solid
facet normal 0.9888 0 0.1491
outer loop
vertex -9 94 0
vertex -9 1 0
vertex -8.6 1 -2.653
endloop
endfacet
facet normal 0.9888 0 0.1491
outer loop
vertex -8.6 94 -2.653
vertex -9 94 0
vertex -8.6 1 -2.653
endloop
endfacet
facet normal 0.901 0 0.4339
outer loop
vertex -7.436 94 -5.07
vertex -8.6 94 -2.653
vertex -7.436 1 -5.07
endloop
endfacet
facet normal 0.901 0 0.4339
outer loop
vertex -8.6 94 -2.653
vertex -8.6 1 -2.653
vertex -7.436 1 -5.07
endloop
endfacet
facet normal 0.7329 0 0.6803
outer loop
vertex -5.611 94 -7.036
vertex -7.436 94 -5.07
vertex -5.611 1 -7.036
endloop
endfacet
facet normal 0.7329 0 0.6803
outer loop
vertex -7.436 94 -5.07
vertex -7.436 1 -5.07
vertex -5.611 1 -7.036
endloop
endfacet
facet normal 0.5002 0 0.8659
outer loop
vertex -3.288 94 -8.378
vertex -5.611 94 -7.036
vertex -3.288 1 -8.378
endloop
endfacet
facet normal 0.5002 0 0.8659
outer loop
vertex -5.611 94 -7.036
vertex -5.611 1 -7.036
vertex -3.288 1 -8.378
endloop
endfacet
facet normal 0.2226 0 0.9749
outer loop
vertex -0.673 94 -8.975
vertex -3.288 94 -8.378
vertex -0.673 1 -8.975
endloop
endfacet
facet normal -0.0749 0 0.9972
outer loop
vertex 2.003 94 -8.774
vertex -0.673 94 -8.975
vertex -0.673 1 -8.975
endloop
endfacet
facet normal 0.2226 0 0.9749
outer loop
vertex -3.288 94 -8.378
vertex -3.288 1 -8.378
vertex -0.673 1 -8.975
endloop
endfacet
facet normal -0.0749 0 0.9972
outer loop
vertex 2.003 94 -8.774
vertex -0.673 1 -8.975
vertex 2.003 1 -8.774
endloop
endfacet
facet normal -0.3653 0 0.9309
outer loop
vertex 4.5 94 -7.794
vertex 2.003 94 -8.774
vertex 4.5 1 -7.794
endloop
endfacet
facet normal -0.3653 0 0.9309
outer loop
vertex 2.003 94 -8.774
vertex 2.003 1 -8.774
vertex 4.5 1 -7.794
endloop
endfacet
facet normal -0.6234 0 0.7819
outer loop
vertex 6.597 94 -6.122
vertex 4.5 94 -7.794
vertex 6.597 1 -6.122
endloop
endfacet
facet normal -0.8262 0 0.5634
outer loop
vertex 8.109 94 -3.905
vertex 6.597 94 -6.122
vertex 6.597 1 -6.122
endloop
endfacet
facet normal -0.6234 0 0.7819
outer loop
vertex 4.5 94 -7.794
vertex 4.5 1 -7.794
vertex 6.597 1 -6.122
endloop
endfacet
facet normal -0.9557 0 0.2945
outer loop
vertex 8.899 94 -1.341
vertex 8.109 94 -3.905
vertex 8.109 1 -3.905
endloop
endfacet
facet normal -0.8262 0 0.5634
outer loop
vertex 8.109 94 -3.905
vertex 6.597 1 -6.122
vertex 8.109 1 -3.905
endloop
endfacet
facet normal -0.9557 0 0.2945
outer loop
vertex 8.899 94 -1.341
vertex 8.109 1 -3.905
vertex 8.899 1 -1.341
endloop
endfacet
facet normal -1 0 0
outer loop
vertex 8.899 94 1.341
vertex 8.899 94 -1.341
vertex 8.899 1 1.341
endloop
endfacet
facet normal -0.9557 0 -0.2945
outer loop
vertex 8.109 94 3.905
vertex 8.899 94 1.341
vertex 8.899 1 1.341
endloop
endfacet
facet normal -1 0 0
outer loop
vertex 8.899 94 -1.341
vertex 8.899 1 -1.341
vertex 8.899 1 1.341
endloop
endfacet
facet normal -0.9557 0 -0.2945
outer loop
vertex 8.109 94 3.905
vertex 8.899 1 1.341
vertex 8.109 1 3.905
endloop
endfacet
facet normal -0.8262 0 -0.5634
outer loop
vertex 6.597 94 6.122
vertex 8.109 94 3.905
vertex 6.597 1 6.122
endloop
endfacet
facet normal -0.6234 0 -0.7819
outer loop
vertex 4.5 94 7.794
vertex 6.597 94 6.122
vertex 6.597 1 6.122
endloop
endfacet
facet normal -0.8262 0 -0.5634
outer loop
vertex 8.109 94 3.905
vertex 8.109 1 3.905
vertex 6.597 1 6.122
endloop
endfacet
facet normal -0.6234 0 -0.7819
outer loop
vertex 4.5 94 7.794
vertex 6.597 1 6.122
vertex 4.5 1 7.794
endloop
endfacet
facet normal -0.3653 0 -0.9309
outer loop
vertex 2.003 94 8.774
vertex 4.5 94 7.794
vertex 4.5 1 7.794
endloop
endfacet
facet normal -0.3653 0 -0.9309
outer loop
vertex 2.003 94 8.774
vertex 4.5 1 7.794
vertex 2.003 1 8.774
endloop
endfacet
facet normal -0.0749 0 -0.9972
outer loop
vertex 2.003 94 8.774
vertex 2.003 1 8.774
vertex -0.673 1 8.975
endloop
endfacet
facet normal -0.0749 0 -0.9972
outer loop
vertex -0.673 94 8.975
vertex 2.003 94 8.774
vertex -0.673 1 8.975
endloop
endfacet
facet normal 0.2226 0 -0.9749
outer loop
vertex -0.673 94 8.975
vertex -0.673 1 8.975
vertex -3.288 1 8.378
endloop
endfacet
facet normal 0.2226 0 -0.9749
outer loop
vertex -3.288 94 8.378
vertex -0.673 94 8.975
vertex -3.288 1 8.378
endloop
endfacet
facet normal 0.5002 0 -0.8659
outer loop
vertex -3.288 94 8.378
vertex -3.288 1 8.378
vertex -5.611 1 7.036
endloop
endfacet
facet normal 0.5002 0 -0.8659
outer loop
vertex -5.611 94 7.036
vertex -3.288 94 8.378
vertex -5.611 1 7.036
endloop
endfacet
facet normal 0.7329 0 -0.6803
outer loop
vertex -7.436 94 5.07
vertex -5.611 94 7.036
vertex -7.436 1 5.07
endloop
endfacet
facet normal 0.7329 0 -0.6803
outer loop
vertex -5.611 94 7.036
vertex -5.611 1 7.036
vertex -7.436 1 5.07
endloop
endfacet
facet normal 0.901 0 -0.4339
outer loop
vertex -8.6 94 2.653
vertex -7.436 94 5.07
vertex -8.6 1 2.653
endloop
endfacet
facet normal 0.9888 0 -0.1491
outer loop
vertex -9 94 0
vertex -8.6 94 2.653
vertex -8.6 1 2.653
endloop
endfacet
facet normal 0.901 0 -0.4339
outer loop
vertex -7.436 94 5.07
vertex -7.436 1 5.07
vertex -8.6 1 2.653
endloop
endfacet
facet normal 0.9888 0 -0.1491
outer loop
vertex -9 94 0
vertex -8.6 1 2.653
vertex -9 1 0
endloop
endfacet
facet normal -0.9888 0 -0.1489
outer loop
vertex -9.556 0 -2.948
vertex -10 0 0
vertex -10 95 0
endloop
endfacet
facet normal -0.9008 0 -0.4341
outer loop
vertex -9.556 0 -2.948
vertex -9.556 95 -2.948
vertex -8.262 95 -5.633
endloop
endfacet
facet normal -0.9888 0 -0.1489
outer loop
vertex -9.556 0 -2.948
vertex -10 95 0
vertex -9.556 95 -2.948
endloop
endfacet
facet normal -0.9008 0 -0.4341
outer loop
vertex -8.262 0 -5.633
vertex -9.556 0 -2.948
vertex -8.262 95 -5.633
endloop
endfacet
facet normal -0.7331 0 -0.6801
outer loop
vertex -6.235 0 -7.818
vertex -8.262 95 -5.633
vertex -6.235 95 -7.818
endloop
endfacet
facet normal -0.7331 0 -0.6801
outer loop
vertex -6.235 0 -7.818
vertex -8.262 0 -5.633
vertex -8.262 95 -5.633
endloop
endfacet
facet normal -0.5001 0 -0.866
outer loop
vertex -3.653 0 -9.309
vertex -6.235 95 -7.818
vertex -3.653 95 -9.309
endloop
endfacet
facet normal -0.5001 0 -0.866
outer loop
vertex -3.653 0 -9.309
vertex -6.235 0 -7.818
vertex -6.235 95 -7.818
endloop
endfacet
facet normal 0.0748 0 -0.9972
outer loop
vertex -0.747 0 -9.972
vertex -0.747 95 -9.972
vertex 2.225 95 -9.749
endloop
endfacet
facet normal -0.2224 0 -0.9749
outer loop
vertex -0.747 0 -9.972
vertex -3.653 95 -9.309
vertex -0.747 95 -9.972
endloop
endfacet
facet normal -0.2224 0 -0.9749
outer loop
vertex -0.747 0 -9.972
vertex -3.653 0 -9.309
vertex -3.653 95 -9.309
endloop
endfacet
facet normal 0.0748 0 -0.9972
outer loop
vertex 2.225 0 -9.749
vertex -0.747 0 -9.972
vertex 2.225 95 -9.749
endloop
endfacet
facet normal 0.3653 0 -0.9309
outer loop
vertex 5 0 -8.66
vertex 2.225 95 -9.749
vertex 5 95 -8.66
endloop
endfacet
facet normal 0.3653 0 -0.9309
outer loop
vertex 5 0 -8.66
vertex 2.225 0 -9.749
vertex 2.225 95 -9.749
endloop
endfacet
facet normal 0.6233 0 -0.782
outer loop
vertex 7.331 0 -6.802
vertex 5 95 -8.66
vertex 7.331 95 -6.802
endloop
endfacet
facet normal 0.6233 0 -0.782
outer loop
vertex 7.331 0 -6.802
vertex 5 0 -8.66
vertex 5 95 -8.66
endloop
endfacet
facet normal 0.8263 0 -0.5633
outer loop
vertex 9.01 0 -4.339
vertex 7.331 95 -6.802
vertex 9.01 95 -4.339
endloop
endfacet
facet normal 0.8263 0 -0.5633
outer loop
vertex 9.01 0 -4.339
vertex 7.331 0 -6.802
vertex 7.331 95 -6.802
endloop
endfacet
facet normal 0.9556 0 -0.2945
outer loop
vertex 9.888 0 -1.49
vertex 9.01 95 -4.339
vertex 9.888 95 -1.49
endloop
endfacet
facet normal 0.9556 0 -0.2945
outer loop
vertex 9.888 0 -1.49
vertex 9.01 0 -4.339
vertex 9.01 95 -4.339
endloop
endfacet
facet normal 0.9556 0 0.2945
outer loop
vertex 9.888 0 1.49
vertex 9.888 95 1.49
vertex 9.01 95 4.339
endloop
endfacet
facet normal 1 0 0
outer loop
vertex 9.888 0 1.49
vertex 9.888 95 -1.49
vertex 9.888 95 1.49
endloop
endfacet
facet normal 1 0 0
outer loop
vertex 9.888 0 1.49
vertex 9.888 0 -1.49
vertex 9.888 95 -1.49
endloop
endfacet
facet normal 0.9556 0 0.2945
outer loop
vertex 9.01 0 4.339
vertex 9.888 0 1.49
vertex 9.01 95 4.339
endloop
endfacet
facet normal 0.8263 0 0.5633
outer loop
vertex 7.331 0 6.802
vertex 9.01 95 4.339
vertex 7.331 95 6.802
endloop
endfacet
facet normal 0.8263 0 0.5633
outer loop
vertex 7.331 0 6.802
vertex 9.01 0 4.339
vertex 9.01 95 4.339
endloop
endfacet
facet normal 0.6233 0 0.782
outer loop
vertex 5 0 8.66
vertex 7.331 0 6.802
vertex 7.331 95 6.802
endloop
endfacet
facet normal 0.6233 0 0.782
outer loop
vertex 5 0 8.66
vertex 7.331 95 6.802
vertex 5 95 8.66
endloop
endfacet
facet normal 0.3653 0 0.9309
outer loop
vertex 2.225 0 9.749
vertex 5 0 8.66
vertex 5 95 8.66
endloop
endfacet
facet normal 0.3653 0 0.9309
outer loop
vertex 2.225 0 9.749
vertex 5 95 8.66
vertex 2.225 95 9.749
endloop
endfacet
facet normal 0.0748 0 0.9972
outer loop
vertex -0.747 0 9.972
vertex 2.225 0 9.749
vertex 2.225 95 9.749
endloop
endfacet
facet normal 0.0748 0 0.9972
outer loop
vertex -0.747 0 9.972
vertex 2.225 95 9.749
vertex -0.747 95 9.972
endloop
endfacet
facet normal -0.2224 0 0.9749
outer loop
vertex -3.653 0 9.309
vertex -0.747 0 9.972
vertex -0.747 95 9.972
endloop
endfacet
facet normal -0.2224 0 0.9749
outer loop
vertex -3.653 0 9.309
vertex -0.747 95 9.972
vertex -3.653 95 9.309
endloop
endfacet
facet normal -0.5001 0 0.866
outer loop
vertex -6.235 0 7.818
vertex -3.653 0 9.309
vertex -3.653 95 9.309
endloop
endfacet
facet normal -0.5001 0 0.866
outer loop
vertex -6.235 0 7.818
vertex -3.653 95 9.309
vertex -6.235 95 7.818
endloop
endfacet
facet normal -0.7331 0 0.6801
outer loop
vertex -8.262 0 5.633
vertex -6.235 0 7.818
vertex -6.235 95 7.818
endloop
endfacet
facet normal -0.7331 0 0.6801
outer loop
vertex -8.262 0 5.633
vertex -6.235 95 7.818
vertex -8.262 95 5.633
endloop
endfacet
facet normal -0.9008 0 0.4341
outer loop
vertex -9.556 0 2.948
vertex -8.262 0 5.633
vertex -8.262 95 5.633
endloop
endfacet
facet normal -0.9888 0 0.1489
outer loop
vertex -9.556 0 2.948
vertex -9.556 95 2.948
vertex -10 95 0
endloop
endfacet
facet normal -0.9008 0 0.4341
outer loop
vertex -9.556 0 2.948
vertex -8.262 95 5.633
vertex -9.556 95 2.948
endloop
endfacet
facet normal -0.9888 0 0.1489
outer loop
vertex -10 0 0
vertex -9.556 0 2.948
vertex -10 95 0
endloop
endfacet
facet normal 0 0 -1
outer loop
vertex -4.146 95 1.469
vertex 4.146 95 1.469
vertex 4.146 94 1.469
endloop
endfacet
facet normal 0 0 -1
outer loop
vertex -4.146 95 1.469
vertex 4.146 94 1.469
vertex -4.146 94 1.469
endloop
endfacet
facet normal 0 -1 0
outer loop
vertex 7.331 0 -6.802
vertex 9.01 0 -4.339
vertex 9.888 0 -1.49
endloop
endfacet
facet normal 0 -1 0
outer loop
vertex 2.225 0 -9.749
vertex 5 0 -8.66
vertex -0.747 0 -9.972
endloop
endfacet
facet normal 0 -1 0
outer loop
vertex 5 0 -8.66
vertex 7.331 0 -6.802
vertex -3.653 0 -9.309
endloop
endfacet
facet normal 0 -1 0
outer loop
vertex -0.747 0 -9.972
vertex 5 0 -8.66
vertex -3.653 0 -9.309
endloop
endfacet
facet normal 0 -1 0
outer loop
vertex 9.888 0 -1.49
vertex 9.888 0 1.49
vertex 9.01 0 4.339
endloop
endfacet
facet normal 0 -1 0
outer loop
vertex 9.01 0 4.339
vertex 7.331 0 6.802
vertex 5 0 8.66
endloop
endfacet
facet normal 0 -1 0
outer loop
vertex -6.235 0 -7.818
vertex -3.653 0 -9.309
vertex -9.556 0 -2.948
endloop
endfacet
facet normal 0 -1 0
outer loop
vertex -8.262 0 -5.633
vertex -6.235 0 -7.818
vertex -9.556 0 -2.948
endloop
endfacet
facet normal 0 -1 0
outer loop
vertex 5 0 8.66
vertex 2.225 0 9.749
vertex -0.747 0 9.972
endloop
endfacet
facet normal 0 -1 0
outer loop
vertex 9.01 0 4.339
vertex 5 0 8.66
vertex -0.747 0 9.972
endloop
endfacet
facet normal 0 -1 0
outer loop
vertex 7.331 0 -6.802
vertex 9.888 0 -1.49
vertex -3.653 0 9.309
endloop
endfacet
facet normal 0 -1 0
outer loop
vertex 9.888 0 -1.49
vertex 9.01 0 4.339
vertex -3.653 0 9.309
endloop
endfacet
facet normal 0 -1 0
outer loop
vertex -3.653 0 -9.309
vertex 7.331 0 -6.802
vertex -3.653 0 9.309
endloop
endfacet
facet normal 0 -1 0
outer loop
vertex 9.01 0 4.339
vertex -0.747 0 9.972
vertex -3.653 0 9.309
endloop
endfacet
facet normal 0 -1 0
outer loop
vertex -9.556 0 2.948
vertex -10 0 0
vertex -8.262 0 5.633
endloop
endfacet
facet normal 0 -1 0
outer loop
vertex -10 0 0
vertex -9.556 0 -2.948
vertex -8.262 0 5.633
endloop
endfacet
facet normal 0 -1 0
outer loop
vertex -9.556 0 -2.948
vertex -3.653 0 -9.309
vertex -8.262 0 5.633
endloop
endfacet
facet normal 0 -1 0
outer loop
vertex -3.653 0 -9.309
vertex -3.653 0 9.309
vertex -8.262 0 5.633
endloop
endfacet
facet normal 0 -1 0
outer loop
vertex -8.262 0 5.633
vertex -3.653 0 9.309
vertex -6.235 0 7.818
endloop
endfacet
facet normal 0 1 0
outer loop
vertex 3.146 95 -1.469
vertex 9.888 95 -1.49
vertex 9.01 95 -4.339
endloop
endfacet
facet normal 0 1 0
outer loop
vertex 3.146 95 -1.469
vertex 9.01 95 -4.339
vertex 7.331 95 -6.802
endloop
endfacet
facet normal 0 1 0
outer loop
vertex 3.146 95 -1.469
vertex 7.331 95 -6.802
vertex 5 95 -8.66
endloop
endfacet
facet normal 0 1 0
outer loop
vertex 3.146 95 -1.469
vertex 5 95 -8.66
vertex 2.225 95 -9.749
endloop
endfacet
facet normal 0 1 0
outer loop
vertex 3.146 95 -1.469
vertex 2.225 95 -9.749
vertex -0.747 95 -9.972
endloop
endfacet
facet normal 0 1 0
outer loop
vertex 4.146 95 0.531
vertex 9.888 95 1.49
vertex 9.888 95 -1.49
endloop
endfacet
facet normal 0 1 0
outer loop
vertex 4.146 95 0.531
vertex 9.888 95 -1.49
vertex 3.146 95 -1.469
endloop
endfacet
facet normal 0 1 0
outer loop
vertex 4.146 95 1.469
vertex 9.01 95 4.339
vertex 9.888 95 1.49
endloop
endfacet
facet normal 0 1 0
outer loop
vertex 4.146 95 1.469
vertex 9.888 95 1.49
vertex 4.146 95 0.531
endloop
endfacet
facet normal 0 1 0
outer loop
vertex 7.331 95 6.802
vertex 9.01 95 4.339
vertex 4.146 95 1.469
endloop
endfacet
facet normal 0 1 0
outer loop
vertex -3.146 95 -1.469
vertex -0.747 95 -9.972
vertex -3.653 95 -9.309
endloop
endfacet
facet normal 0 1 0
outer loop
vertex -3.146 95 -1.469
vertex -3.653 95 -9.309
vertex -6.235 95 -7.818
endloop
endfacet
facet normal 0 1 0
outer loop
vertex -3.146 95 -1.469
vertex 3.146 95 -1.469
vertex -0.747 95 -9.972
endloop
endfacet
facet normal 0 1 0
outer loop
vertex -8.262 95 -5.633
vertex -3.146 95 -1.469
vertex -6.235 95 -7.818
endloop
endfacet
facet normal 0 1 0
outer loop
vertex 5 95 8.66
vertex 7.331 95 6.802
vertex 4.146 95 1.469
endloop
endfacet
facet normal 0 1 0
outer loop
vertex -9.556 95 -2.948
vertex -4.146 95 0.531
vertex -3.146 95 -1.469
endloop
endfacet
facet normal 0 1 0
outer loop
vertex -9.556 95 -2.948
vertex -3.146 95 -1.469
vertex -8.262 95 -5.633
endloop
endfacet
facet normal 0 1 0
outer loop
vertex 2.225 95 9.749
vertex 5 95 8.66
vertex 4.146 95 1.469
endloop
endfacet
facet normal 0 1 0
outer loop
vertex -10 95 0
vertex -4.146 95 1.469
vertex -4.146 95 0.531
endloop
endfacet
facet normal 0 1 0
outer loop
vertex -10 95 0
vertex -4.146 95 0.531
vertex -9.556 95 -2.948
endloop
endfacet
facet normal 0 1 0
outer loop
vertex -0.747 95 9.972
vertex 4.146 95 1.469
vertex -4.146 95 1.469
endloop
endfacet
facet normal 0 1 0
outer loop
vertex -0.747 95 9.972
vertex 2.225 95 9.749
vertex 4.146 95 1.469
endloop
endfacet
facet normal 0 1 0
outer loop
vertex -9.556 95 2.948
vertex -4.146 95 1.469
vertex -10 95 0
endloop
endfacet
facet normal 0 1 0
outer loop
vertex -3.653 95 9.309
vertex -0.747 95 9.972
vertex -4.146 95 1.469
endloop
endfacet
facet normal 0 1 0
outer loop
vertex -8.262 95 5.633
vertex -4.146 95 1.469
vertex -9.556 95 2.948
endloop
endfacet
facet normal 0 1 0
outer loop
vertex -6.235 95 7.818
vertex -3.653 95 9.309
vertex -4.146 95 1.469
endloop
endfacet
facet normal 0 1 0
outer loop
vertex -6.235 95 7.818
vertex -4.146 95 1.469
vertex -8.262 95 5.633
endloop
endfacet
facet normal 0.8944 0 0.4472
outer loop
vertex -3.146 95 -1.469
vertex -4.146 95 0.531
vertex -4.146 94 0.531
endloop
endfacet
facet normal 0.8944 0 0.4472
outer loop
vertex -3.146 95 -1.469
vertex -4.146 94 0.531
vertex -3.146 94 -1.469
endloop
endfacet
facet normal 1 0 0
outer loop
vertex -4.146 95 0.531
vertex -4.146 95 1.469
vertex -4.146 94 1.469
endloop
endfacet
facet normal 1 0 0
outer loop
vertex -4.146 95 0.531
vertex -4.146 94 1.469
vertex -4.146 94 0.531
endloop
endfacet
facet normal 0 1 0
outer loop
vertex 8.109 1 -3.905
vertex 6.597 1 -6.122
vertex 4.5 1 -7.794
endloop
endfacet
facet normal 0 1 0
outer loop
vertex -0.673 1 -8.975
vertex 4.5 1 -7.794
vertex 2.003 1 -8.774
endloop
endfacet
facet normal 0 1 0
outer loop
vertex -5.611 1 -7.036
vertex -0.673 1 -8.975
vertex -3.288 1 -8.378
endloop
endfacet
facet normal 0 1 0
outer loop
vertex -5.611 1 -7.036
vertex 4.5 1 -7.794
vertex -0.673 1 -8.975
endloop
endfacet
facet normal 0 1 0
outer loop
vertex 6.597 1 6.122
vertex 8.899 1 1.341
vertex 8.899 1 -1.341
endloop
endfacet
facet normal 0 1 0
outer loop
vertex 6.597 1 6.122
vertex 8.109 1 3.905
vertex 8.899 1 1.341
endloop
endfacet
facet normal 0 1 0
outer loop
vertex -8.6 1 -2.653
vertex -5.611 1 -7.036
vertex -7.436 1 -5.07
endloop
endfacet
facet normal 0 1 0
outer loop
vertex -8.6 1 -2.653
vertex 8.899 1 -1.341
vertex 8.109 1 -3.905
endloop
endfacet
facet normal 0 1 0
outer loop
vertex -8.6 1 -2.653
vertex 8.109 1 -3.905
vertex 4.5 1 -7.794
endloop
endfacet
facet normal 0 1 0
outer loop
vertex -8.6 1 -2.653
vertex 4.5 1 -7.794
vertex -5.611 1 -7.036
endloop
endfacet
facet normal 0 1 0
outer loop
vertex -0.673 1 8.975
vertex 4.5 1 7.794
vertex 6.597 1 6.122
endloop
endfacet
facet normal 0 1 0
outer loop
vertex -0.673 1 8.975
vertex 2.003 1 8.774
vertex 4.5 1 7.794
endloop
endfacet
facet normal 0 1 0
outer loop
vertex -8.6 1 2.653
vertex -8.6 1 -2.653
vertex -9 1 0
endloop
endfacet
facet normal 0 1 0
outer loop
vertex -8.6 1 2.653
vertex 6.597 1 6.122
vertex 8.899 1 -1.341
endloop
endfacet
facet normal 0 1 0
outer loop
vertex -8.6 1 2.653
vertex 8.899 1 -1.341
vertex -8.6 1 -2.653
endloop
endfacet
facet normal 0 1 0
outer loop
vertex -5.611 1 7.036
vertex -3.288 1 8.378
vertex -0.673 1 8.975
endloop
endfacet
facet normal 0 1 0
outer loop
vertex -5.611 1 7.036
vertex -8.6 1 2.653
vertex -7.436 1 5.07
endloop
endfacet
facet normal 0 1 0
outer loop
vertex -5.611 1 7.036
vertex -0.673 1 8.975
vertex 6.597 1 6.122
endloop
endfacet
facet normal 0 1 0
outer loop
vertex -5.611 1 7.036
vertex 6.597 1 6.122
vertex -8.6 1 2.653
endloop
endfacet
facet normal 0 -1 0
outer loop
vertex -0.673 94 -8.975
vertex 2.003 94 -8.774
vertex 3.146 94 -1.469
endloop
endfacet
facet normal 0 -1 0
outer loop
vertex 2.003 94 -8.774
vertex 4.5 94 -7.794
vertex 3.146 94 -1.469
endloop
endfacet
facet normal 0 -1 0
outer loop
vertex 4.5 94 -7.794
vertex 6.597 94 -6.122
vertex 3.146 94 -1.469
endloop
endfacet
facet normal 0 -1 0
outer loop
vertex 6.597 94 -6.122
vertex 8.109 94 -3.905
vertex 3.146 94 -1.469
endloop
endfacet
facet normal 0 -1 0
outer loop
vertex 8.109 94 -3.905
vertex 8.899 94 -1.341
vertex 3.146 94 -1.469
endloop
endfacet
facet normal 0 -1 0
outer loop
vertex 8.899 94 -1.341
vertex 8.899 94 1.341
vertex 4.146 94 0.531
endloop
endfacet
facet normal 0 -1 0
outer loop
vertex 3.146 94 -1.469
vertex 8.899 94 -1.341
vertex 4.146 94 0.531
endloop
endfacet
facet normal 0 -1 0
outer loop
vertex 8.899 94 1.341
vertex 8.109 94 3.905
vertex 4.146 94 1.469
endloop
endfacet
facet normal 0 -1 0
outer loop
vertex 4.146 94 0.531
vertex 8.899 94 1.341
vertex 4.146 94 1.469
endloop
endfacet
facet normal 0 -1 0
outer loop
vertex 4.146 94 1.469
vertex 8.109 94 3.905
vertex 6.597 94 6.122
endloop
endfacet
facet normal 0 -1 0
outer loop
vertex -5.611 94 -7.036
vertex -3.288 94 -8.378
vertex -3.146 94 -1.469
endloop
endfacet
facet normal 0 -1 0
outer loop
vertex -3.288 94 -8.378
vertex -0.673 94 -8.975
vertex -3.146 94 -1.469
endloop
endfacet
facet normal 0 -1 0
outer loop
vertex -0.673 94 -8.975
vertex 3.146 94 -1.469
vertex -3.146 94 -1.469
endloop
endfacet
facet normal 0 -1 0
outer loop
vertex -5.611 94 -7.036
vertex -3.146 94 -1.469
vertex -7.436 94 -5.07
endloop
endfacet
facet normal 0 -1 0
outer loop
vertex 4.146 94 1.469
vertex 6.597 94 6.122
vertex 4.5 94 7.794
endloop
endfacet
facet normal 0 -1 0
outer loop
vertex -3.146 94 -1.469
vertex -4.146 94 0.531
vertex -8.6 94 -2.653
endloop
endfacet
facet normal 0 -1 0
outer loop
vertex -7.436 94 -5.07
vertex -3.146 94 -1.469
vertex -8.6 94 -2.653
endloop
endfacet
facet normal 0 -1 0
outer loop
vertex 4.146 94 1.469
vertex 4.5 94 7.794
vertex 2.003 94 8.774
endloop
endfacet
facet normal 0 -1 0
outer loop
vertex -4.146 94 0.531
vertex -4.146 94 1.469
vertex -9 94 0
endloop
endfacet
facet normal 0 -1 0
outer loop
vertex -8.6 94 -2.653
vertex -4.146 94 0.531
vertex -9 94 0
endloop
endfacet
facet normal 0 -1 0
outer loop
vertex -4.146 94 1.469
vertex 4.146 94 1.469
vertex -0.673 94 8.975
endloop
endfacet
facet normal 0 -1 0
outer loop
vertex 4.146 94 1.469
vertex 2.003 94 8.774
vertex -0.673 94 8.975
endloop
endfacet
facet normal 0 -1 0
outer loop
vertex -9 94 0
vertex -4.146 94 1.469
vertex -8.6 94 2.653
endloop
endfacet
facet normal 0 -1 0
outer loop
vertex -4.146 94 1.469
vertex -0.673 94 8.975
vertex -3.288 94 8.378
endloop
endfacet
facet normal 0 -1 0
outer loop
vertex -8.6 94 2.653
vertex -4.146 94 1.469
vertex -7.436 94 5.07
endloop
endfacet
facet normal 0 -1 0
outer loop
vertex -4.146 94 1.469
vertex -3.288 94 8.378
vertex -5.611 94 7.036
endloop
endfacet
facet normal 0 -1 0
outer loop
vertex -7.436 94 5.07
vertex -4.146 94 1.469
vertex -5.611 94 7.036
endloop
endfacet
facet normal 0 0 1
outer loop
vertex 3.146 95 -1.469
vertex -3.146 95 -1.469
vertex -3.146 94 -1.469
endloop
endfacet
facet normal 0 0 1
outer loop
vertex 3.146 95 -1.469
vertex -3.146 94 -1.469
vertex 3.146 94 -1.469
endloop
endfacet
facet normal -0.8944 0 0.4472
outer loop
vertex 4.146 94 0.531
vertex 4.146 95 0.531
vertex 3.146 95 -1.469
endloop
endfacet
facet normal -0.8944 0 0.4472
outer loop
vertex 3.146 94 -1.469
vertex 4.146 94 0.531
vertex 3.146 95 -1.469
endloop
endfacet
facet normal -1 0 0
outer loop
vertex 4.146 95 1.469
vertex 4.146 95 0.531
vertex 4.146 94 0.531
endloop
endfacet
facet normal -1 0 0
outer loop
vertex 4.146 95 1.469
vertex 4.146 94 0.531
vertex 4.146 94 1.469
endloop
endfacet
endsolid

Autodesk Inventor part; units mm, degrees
ref_plane "YZ Plane" through (0, 0, 0) normal (1, 0, 0) x (0, 1, 0)
ref_plane "XZ Plane" through (0, 0, 0) normal (0, 1, 0) x (-1, 0, 0)
ref_plane "XY Plane" through (0, 0, 0) normal (0, 0, 1) x (1, 0, 0)
sketch "Sketch1" plane through (0, 0, 0) normal (0, 1, 0) x (-1, 0, 0)
  circle A0 centre (0, 0) radius 10
  dimension "d0" = 20
extrude "Extrusion1" add sketch "Sketch1" along normal blind 95
shell "Shell1" thickness 1 removed faces 0
sketch "Sketch3" plane through (0, 95, 0) normal (0, 1, 0) x (1, 0, 0)
  circle A0 centre (0, 0) radius 10 projected
  line L0 (-3.1462, 1.4689) -> (3.1462, 1.4689)
  line L1 (4.1462, -0.5311) -> (4.1462, -1.4689)
  line L2 (4.1462, -1.4689) -> (-4.1462, -1.4689)
  line L3 (-4.1462, -1.4689) -> (-4.1462, -0.5311)
  line L4 (-4.1462, 1.4689) -> (4.1462, -1.4689) construction
  line L5 (4.1462, 1.4689) -> (-4.1462, -1.4689) construction
  line L6 (-4.1462, -0.5311) -> (-3.1462, 1.4689)
  line L7 (4.1462, -0.5311) -> (3.1462, 1.4689)
  dimension "d8" = 2
  dimension "d9" = 1
  dimension "d10" = 2
  dimension "d11" = 1
extrude "Extrusion3" cut sketch "Sketch3" against normal blind 5 contours L0 L7 L1 L2 L3 L6
properties part number "blank"
